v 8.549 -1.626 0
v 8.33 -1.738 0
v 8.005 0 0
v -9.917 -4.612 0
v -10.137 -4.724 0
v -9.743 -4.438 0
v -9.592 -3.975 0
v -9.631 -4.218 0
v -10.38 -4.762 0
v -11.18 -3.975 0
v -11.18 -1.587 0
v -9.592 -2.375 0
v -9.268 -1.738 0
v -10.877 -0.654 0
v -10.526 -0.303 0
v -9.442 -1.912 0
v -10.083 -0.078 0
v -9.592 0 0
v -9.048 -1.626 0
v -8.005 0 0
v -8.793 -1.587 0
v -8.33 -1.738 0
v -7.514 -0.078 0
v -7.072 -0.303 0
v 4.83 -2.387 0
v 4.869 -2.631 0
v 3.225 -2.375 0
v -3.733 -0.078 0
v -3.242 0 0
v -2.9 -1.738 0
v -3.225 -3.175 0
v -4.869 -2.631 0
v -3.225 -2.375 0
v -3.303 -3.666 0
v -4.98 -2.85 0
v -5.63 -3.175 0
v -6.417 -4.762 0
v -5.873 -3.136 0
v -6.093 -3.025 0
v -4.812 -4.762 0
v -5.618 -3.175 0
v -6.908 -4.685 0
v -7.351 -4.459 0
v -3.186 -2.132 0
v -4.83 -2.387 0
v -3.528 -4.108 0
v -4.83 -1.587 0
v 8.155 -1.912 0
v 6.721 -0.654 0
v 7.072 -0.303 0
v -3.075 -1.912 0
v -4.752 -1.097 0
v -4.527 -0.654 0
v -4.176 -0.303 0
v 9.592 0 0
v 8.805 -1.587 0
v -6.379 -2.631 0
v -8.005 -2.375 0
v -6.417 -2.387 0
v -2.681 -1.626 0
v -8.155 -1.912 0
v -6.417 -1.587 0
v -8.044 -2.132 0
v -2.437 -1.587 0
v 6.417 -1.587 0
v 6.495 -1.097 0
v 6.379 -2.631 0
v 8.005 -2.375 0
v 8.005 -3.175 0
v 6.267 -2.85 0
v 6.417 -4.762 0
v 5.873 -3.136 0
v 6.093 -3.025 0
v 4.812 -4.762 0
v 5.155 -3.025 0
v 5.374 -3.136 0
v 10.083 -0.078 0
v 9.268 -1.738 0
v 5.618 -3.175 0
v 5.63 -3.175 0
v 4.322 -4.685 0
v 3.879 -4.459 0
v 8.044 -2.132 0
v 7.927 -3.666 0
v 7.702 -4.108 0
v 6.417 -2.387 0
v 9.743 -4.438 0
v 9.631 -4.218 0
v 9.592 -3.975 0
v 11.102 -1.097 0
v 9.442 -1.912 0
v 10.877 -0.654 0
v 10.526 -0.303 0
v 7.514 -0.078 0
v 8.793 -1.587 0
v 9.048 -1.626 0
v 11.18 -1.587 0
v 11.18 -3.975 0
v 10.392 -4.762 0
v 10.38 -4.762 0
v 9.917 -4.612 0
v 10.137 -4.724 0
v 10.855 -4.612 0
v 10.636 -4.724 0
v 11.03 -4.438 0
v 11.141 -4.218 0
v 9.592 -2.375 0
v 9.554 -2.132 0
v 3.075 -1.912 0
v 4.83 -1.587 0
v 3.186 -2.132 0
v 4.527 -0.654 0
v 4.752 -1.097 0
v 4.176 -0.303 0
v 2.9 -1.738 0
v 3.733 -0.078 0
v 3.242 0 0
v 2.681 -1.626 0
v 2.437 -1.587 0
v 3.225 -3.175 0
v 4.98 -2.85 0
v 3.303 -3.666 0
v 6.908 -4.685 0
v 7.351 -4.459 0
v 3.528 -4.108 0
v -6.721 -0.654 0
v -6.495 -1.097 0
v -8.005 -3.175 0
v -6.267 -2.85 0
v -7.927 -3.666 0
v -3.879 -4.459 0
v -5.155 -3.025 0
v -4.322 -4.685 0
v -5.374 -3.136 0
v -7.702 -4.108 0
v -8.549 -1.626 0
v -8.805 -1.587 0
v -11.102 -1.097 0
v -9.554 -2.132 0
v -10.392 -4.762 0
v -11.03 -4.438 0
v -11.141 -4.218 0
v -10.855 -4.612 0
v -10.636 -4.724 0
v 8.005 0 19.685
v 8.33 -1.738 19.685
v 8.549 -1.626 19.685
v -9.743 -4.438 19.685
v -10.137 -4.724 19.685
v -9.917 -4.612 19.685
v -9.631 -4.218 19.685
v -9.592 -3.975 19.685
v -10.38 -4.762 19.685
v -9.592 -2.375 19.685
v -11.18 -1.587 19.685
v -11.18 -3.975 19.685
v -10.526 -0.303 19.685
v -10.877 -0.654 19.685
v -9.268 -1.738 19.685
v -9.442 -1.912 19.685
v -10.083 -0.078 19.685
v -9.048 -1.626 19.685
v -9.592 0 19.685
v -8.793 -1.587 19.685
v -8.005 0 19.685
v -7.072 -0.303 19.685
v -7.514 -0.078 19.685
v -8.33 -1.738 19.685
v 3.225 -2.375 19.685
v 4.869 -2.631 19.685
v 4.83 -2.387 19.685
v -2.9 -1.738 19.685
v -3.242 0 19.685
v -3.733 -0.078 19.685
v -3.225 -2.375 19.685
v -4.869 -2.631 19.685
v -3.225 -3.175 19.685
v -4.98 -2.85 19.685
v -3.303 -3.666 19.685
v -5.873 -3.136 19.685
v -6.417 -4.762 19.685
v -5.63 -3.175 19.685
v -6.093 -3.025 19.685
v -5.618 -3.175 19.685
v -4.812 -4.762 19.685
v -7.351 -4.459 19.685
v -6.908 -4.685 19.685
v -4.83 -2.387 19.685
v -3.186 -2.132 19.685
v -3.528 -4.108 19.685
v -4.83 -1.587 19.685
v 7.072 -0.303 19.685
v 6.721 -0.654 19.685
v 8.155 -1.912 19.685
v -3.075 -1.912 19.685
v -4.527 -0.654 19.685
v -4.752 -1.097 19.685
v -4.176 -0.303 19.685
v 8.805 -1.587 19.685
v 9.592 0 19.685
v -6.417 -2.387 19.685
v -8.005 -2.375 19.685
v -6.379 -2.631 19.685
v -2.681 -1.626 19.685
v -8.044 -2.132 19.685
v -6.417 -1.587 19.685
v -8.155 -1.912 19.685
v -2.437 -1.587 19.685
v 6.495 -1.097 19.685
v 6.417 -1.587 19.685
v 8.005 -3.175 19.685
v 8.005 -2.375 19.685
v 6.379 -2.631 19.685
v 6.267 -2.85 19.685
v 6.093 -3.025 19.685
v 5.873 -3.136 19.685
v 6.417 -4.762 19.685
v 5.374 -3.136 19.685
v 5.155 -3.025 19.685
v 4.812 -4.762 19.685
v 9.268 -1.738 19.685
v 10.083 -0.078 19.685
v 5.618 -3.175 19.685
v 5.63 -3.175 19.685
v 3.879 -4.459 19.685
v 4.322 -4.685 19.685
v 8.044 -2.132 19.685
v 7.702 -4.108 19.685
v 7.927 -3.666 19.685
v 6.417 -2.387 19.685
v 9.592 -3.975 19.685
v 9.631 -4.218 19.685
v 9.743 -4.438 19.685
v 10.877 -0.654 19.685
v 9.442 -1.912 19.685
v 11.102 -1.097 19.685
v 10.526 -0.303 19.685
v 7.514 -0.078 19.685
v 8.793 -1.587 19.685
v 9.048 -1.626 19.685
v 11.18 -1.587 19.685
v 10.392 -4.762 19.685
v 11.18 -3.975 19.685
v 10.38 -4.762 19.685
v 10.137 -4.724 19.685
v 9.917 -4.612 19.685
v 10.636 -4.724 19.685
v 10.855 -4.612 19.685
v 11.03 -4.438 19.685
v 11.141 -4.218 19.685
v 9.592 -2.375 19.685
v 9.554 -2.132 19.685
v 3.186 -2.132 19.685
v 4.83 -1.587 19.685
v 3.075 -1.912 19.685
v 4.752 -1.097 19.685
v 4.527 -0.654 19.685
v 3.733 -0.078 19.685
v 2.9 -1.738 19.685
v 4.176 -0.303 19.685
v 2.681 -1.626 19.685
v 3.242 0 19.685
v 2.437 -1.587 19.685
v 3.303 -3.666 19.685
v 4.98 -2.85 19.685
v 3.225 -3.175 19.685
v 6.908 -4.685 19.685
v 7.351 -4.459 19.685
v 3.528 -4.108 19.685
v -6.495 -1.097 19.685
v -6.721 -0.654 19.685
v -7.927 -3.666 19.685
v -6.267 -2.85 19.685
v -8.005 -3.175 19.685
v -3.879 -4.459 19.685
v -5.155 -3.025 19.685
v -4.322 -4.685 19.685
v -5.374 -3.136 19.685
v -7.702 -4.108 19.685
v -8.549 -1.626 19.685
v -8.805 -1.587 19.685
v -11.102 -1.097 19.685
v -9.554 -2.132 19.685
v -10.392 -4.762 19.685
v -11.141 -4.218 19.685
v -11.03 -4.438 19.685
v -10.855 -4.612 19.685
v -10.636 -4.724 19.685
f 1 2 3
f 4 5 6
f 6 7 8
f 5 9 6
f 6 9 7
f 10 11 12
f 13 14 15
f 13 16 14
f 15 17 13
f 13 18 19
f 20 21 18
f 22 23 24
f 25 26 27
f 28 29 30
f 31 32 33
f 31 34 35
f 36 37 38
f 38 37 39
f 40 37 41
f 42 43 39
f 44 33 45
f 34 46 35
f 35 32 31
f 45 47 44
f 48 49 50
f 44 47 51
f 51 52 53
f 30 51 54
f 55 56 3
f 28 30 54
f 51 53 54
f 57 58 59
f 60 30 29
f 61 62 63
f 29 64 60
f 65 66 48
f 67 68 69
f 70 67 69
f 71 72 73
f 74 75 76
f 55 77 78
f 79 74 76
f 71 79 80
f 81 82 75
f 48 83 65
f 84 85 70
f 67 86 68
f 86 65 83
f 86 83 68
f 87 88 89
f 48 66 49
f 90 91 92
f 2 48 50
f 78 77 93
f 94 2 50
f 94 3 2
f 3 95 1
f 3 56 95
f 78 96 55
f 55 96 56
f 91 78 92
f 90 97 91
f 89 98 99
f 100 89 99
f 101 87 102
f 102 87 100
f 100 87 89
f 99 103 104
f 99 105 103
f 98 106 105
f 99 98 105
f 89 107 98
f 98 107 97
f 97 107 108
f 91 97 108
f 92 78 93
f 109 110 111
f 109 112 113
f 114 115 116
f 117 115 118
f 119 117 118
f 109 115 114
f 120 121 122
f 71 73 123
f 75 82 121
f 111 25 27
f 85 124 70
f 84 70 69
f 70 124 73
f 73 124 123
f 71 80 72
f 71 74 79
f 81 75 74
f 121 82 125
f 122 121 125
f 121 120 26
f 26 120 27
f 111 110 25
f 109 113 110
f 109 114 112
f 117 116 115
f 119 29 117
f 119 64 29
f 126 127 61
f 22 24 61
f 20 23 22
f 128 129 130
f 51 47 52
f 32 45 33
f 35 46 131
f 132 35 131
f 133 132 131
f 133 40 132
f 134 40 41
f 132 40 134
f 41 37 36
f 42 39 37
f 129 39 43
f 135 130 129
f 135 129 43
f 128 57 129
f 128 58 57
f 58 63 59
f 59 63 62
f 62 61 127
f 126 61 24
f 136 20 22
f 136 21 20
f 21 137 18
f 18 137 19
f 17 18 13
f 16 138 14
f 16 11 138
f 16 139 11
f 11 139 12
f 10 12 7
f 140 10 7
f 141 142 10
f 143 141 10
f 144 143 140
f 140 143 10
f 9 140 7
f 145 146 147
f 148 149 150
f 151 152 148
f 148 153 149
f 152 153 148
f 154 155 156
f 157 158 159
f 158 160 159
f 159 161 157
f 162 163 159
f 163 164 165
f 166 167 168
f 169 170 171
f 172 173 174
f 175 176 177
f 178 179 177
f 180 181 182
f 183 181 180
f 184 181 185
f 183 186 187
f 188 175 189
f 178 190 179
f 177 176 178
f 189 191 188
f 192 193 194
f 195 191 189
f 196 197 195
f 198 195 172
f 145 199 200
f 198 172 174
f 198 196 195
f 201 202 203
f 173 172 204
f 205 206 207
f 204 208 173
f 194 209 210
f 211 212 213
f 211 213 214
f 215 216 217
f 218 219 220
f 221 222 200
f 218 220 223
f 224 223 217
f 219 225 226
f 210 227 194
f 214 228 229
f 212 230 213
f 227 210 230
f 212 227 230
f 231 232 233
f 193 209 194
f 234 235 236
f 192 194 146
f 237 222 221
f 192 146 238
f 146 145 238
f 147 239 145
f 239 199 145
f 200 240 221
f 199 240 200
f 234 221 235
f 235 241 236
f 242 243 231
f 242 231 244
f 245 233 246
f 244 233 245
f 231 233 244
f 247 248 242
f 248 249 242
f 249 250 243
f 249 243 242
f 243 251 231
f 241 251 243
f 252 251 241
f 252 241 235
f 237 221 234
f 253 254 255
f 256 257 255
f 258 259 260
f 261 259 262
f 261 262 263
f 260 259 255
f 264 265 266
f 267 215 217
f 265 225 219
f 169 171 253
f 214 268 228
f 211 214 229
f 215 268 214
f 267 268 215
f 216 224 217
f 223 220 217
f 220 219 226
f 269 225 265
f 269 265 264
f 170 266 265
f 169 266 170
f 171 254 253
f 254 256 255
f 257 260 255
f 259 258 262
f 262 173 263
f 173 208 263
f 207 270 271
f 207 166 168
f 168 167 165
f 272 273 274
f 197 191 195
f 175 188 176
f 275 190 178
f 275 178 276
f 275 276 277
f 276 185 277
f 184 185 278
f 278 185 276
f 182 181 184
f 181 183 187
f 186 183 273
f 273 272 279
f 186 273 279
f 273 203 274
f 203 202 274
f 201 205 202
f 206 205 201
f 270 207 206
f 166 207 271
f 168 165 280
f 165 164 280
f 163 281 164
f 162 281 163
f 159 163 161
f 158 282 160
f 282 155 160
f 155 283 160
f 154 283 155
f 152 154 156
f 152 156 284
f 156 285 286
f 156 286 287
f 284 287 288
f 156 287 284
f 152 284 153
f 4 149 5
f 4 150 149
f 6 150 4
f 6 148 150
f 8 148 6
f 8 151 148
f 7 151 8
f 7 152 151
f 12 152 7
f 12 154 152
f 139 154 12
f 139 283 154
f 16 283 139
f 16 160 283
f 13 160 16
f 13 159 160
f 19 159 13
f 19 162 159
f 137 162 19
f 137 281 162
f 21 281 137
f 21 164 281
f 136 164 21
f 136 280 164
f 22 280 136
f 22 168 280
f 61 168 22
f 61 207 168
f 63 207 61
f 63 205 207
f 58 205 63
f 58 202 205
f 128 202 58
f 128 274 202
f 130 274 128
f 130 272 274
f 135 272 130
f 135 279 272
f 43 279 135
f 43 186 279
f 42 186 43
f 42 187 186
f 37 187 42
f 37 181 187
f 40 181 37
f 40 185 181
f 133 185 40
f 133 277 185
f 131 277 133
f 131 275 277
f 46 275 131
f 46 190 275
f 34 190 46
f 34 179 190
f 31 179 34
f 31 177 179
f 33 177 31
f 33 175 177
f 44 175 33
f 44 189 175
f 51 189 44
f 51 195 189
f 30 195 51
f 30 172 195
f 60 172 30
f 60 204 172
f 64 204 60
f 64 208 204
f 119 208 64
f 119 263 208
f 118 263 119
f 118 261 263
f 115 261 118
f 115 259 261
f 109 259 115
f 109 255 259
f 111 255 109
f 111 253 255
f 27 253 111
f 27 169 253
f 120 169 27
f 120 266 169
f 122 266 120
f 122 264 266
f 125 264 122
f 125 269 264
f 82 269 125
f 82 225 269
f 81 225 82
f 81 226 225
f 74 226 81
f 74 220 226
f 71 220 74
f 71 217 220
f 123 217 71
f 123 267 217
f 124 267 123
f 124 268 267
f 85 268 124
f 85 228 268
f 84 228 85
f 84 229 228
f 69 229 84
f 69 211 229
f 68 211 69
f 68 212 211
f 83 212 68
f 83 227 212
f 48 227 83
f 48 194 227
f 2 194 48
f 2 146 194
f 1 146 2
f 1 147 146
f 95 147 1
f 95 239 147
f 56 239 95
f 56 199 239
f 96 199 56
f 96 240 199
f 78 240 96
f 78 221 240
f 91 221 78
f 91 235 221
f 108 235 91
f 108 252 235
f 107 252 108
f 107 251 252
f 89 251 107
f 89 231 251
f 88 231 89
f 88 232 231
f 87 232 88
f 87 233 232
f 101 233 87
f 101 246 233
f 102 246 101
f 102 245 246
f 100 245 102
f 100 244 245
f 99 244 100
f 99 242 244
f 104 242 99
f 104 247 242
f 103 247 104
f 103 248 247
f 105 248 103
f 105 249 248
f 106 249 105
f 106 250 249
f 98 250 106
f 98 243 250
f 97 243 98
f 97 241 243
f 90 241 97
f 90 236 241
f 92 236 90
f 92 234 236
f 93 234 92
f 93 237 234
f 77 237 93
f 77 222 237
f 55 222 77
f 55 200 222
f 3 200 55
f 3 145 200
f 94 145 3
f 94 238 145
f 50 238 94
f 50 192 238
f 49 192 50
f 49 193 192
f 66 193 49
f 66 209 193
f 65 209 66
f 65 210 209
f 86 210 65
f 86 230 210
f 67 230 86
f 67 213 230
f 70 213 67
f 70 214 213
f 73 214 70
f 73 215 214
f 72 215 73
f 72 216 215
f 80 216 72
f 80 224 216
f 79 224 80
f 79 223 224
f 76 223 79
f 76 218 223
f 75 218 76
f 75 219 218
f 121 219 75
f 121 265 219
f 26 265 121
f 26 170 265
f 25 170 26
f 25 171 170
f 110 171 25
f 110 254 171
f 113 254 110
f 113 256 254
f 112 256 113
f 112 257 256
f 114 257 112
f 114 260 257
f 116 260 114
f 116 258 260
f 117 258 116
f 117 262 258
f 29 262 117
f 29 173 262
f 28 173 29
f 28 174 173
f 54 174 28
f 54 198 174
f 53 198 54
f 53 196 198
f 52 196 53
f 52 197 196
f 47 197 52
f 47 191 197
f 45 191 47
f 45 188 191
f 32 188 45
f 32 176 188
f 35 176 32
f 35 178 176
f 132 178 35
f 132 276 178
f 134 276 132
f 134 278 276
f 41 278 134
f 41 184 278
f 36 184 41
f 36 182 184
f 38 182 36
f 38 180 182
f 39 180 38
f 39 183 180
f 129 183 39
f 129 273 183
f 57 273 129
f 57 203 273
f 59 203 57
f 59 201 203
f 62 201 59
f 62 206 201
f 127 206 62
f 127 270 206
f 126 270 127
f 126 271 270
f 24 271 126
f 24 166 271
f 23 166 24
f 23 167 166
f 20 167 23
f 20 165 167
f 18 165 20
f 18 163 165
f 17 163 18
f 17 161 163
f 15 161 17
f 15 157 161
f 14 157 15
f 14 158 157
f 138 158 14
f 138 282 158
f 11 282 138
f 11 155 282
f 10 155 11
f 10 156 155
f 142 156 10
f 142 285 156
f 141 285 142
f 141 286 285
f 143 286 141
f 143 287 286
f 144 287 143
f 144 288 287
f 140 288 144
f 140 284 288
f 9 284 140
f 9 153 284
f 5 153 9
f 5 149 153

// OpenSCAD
// file: ../lib/TOGUnitTable-v1.scad
// TOGUnitTable-v1.1.0 - Library for handling 'complex amounts' in the form of [multiplier, unit name], e.g. [1.5, "inch"]
//
// 2023-07-01: the following 'annotation' is something I just made up,
// but is intended as a way for future packaging tools to know that it's 'safe'
// (because everything has been somewhat namespaced) to turn a `use <x>`
// into an `include <x>`, making it inlinable:
// safe-to-include: true
// 
// Versions:
// v1.0.0:
// - Created it.
// v1.1.0:
// - Add optional 'dbgctxstr' parameter to unit decoding functions, for better error messages
// 
// Naming convention:
// Doing 'OO without classes', here.
// Fully qualified name = class or package name + "__" + member name
// Class or package name may itself be namespaced, and class names may double as package names.
// Here, tog_unittable names both a class and a package.

// Demo unit table uses 'micrometer' as the base unit
// in order to keep multipliers as integers as much as possible.
tog_unittable__demo_unit_table = [
	["um",    [    1   ,   "um"], "micrometer" ],
	["mm",    [ 1000   ,   "um"], "millimeter" ],
	["inch",  [25400   ,   "um"], "inch"       ],
	["u",     [    1/16, "inch"], "model unit" ], // As used by TGx9 et al
	["atom",  [    8   ,    "u"], "model atom" ],
	["chunk", [    3   , "atom"], "model chunk"],
];

use <./DbgCtxStrLib1.scad>

function tog_unittable__list__filter(list, predicate) = [
	for( item=list ) if( predicate(item) ) item
];
function tog_unittable__list__first(list, on_error) =
	len(list) > 0 ? list[0] : on_error();

function tog_unittable__unit_value_ca(unit_table, unit_name, dbgctxstr=undef) =
	tog_unittable__list__first(
		tog_unittable__list__filter(unit_table, function (entry) entry[0] == unit_name),
		function () assert(false,
			str("Did not find entry for unit '", unit_name, "' in unit table", dbgctxstr_errmsg_suffix(dbgctxstr))
		)
	)[1];

function tog_unittable__ca__is_valid( ca ) =
	is_list(ca) && len(ca) == 2;

// Break down 'amount' until it is in a base unit (one which is defined in terms of itself)
function tog_unittable__simplify_ca(unit_table, amount, dbgctxstr=undef) =
	assert( tog_unittable__ca__is_valid(amount), str(amount, " is not a valid Complex Amount (should be [numeric_value, \"unit_name\"])", dbgctxstr=dbgctxstr) )
	let( unit_value_ca = tog_unittable__unit_value_ca(unit_table, amount[1], dbgctxstr=dbgctxstr) )
	unit_value_ca[1] == amount[1] ? amount :
		tog_unittable__simplify_ca(unit_table, [amount[0] * unit_value_ca[0], unit_value_ca[1]]);

function tog_unittable__divide_ca(unit_table, numerator, denominator, dbgctxstr=undef) =
	let(
		numerator_base_ca   = tog_unittable__simplify_ca(unit_table, numerator, dbgctxstr=dbgctxstr),
		denominator_base_ca = tog_unittable__simplify_ca(unit_table, denominator, dbgctxstr=dbgctxstr)
	)
	assert(numerator_base_ca[1] == denominator_base_ca[1], str("Different base units found for ", numerator[1], " and ", denominator[1]))
	numerator_base_ca[0] / denominator_base_ca[0];	

assert(tog_unittable__divide_ca(tog_unittable__demo_unit_table, [1,   "mm"], [  1, "mm"]) ==     1   );
assert(tog_unittable__divide_ca(tog_unittable__demo_unit_table, [1,   "mm"], [  1, "um"]) ==  1000   );
assert(tog_unittable__divide_ca(tog_unittable__demo_unit_table, [1, "inch"], [  1, "um"]) == 25400   );
assert(tog_unittable__divide_ca(tog_unittable__demo_unit_table, [1, "inch"], [  1, "mm"]) ==    25.4 );
assert(tog_unittable__divide_ca(tog_unittable__demo_unit_table, [1, "inch"], [254, "um"]) ==   100   );
assert(tog_unittable__divide_ca(tog_unittable__demo_unit_table, [1,    "u"], [  1, "um"]) ==  1587.5 );
// file: ../lib/TOGStringLib1.scad
// TOGStringLib1.7
// 
// Functions for parsing quantities
// and other misc. string handling.
// 
// v1.5
// - togstr1_parse_quantity will treat unit-only strings as meaning 1/1 of that unit.
//   e.g. togstr1_parse_quantity("foot") = [[[1,1], "foot", 4]]
// v1.6:
// - togstr1_parse_quantity allows unit name to be omitted when quantity is zero and $togunits1_default_unit is defined
// v1.7:
// - Add optional 'dbgctxstr' parameter to unit decoding functions, for better error messages
// 
// Globals: $togunits1_default_unit - affects what 'unit' is returned
// when interpreting numbers or strings that lack the unit.


function togstr1__todo(message) = assert(false, str("TODO: ", message));

module togstr1__assert_eq(a, b) {
	if( a != b ) {
		assert( a == b, str(a, " != ", b) );
	}
}



function togstr1_slice(source, i0, i1) =
	i0 == i1 ? "" :
	str(source[i0], togstr1_slice(source, i0+1, i1));

function togstr1_tokenize(source, sep, maxcount=9999, i=0, tokenstart=0) =
	len(source) == i ? (
		(tokenstart < i) ? [togstr1_slice(source, tokenstart, i)] : []
	) :
	source[i] == sep ? (
		(tokenstart < i) ? concat([togstr1_slice(source, tokenstart, i)], togstr1_tokenize(source, sep, maxcount-1, i+1, i+1)) :
		togstr1_tokenize(source, sep, maxcount, i+1, i+1)
	) :
	maxcount <= 1 ? [togstr1_slice(source, tokenstart, len(source))] :
	togstr1_tokenize(source, sep, maxcount, i+1, tokenstart);

togstr1__assert_eq( ["foo","bar","baz"], togstr1_tokenize("foo-bar-baz", "-") );
// Duplicate delimiters are ignored
togstr1__assert_eq( ["foo","bar","baz"], togstr1_tokenize("foo--bar--baz", "-") );
// Trailing delimiters are ignored
togstr1__assert_eq( ["foo","bar","baz"], togstr1_tokenize("foo--bar--baz--", "-") );
// Leading delimiters are ignored
togstr1__assert_eq( ["foo","bar","baz"], togstr1_tokenize("--foo--bar--baz", "-") );
// Can limit number of tokens returned
togstr1__assert_eq( ["foo","bar-baz"], togstr1_tokenize("foo-bar-baz", "-", 2) );
togstr1__assert_eq( ["foo","bar-baz"], togstr1_tokenize("--foo--bar-baz", "-", 2) );
togstr1__assert_eq( ["foo","bar--baz"], togstr1_tokenize("--foo--bar--baz", "-", 2) );
togstr1__assert_eq( ["foo"], togstr1_tokenize("--foo--", "-", 2) );




/** \d+ -> [num, end_index] */
function togstr1_parse_decimal_nat(str, index=0, current=0, dbgctxstr=undef) =
	len(str) == index ? [current, index] :
	let( dig = ord(str[index]) - ord("0") )
	(dig >= 0 && dig <= 9) ? togstr1_parse_decimal_nat(str, index+1, current*10 + dig, dbgctxstr=dbgctxstr) :
	[current, index];

togstr1__assert_eq( [123,3], togstr1_parse_decimal_nat("123") );
togstr1__assert_eq( [123,3], togstr1_parse_decimal_nat("123.45") );

/** [+-]*\d+ ->  [[num, den], end_index] */
function togstr1_parse_decimal_number(str, index=0, dbgctxstr=undef) =
	str[index] == "+" ? togstr1_parse_decimal_number(str, index+1) :
	str[index] == "-" ? let(r=togstr1_parse_decimal_number(str, index+1)) [[-r[0][0], r[0][1]], r[1]] :
	let(r = togstr1_parse_decimal_nat(str, index, dbgctxstr=dbgctxstr))
	str[r[1]] != "." ? [[r[0], 1], r[1]] :
	let(fracr = togstr1_parse_decimal_nat(str, r[1]+1))
	let(mult = pow(10, fracr[1]-(r[1]+1)))
	[[r[0]*mult + fracr[0], mult], fracr[1]];

togstr1__assert_eq( [[   36,   1], 2], togstr1_parse_decimal_number( "36"   ) );
togstr1__assert_eq( [[ 3524, 100], 5], togstr1_parse_decimal_number( "35.24") );
togstr1__assert_eq( [[-3524, 100], 6], togstr1_parse_decimal_number("-35.24") );
togstr1__assert_eq( [[    0,   1], 0], togstr1_parse_decimal_number( "NotANumber") );

function togstr1__gcd(a, b) = b == 0 ? abs(a) : togstr1__gcd(b, a % b);

togstr1__assert_eq(10, togstr1__gcd(10, 20));
togstr1__assert_eq( 5, togstr1__gcd(10, 15));
togstr1__assert_eq( 2, togstr1__gcd(10, 14));


function togstr1__normalize_rat(rat) =
	let(gcd = togstr1__gcd(rat[0], rat[1]))
	// TODO: find LCD, divide top and bottom by it
	rat[0] < 0 && rat[1] < 0 ? [-rat[0]/gcd, -rat[1]/gcd] :
	[rat[0]/gcd, rat[1]/gcd];

/** <decnum>[/<decnum>] -> [[num, den], end_index] */
function togstr1__multiply_rat(a, b) =
	togstr1__normalize_rat(
		a[1] == b[1] ? [a[0]*b[0]/a[1], a[1]] : // TODO: LCD instead of special case
		[a[0]*b[0], a[1]*b[1]]
	);
function togstr1__divide_rat(a, b) = togstr1__normalize_rat([a[0]*b[1], a[1]*b[0]]);


function togstr1__add_rat(a, b) =
	togstr1__normalize_rat([a[0]*b[1] + b[0]*a[1], a[1]*b[1]]);
	
togstr1__assert_eq([1, 2], togstr1__add_rat([1, 3], [1, 6]));


/** Return [[num, den], end_index] */
function togstr1_parse_rational_number(str, index=0, dbgctxstr=undef) =
	let( numr = togstr1_parse_decimal_number(str, index, dbgctxstr=dbgctxstr) )
	str[numr[1]] == "+" ?
		let(numrb = togstr1_parse_rational_number(str, numr[1]+1, dbgctxstr=dbgctxstr))
		[togstr1__add_rat(numr[0], numrb[0]), numrb[1]]	:
	str[numr[1]] == "/" ?
		let( denr = togstr1_parse_decimal_number(str, numr[1]+1, dbgctxstr=dbgctxstr) )
		[togstr1__divide_rat(numr[0], denr[0]), denr[1]] :
	numr;

togstr1__assert_eq( [[   123,  1],3], togstr1_parse_rational_number( "123") );
togstr1__assert_eq( [[   123,  1],4], togstr1_parse_rational_number("+123") );
togstr1__assert_eq( [[-  123,  1],4], togstr1_parse_rational_number("-123") );
togstr1__assert_eq( [[   123,  1],6], togstr1_parse_rational_number("-+-123") );
togstr1__assert_eq( [[ 12345,100],6], togstr1_parse_rational_number("123.45") );
togstr1__assert_eq( [[  2469, 40],8], togstr1_parse_rational_number("123.45/2") );
togstr1__assert_eq( [[-  823,160],10], togstr1_parse_rational_number("-123.45/24") );
togstr1__assert_eq( [[     4,  3],5], togstr1_parse_rational_number( "1+1/3") );
togstr1__assert_eq( [[     0,  1],0], togstr1_parse_rational_number( "NotANumber!!") );


/** Return [[[num, den], unit], end_index] */
function togstr1_parse_quantity(str, dbgctxstr=undef) =
	let( numr = togstr1_parse_rational_number(str, dbgctxstr=dbgctxstr) )
	// For now, just let the unit be the rest of the string;
	// can revisit to stop at delimiters if needed in the future.
	numr[1] > 0 && numr[1] == len(str) && numr[0][0] == 0 && !is_undef($togunits1_default_unit) ? [[[0,1], $togunits1_default_unit], numr[1]] :
	assert( numr[1] < len(str), str("Quantity string missing unit: '", str, "'; note that '0' is acceptable if $togunits1_default_unit is defined"))
	let( unit = togstr1_slice(str, numr[1], len(str)) )
	let( quant = numr[1] > 0 ? numr[0] : [1,1] ) // No number = 1 (possibly this should be an error instead)
	[[quant, unit], len(str)];

togstr1__assert_eq( [[[  3,  1], "acre"],  5], togstr1_parse_quantity("3acre") );
togstr1__assert_eq( [[[  3,  5], "acre"],  7], togstr1_parse_quantity("3/5acre") );
togstr1__assert_eq( [[[301,500], "acre"], 10], togstr1_parse_quantity("3.01/5acre") );
togstr1__assert_eq( [[[  1,  1], "acre"],  4], togstr1_parse_quantity("acre") ); // Should either treat as one or throw an error!
togstr1__assert_eq( [[[  0,  1],"hectare"],1], togstr1_parse_quantity("0", $togunits1_default_unit="hectare") ); // Zero is fine if $togunits1_default_unit is defined
// file: ../lib/TOGridLib3.scad
// TOGridPileLib-v3.4
// 
// HOKAY WHAT ARE THE COMMON
// things that I want the library to do?
// 
// - [X] Be `include`-able, to make inlining easy
// - [X] Allow unit table to be overridden easily, but default by default
// - [ ] Support common configurations by name (e.g. "V9", or some "WSTYPE-...")
//   without having to pass 50 different parameters in
// - [ ] Support subtractions for those common configurations also,
//   such that you don't need to remember to 'do less rounding', etc.
// - [ ] Make a simple foot-only block that I can subtract stuff from
//   params: foot style
// - [ ] Make a block with a lip
// - [ ] Make a block foot, and I'll intersect it with some other things
// - [X] Translate a block_size_ca to mm
// 
// Changes:
// v3.1:
// - s/togridpile3_decode_size/togridpile3_decode_vector/
// v3.2:
// - togridpile3_decode(num) = num
// v3.3:
// - Change prefix from `togridpile3` to `togridlib3`
// v3.4:
// - Add optional 'dbgctxstr' parameter to unit decoding functions, for better error messages

use <../lib/TOGUnitTable-v1.scad>

function togridlib3_map(arr, fn) = [ for(item=arr) fn(item) ];

togridlib3_default_unit_table = [
	["um",    [    1,               "um"]],
	["mm",    [ 1000,               "um"]],
	["inch",  [25400,               "um"]],
	["u",     [    1.5875,          "mm"]],
	["atom",  [    8,                "u"]],
	["chunk", [    3,             "atom"]],
	["tgp-standard-bevel"   , [2,    "u"]], // Usuually 1/8"
	["m-outer-corner-radius", [4,    "u"]],
	["f-outer-corner-radius", [3,    "u"]],
];

function togridlib3_get_default_unit_table() = togridlib3_default_unit_table;
function togridlib3_get_unit_table() = is_undef($togridlib3_unit_table) ? togridlib3_default_unit_table : $togridlib3_unit_table;

function togridlib3_decode(dim, unit=[1, "mm"], unit_table=togridlib3_get_unit_table(), dbgctxstr=undef) =
	is_num(dim) ? dim : tog_unittable__divide_ca(unit_table, dim, unit, dbgctxstr=dbgctxstr);
function togridlib3_decode_vector(size, unit=[1, "mm"], unit_table=togridlib3_get_unit_table(), dbgctxstr=undef) =
	togridlib3_map(size, function(dim) is_num(dim) ? dim : tog_unittable__divide_ca(unit_table, dim, unit, dbgctxstr=dbgctxstr));

module togridlib3_cube(size, offset=0) {
	cube(togridlib3_decode_vector(size), center=true);
}
// file: ../lib/DbgCtxStrLib1.scad
// DbgCtxStrLib1.0
// 
// Library for dealing with 'debug context strings' (usually 'dbgctxstr').

function dbgctxstr_errmsg_suffix(dbgctxstr) =
	is_undef(dbgctxstr) || dbgctxstr == "" ? "" :
	str(" (", dbgctxstr, ")");
// file: ../lib/TOGComplexLib1.scad
function tcplx1_multiply(a, b) =
	[a[0]*b[0] - a[1]*b[1], a[0]*b[1] + a[1]*b[0]];
function tcplx1_divide(a, b) =
	let(bot = (b[0]*b[0] + b[1]*b[1]))
	[
		(a[0]*b[0] + a[1]*b[1])/bot,
		(a[1]*b[0] - a[0]*b[1])/bot
	];

assert([-11,23] == tcplx1_multiply([3,2], [1,7]));

assert([-1,3] == tcplx1_multiply([3,1], [0,1]));
assert([-1,3] == tcplx1_multiply([0,1], [3,1]));

echo(tcplx1_divide([-1,3], [3,1]));
assert([0,1] == tcplx1_divide([-1,3], [3,1]));

function tcplx1_normalize(vec) =
	let(veclen = sqrt(vec[0]*vec[0]+vec[1]*vec[1]))
	[vec[0] / veclen, vec[1] / veclen];

function tcplx1_relative_turnvec_vv(v0, v1) =
	tcplx1_divide(tcplx1_normalize(v1), tcplx1_normalize(v0));

function tcplx1_relative_turnvec_abc(p0, p1, p2) = tcplx1_relative_turnvec_vv(p1-p0, p2-p1);

// A 90-degree turn
assert([0,1] == tcplx1_relative_turnvec_abc([0,0], [1,0], [1,1]));
assert([0,1] == tcplx1_relative_turnvec_abc([0,0], [0,1], [-1,1]));

// A 45-degree turn
assert(tcplx1_normalize([1,1]) == tcplx1_relative_turnvec_abc([0,0], [1,0], [ 2,1]));
assert(tcplx1_normalize([1,1]) == tcplx1_relative_turnvec_abc([0,0], [0,1], [-1,2]));


function tcplx1_relative_angle_abc(p0, p1, p2) =
	let(turnvec = tcplx1_relative_turnvec_abc(p0, p1, p2))
	atan2(turnvec[1], turnvec[0]);

assert(-135 == tcplx1_relative_angle_abc([0,0], [1,0], [0,-1]));
assert( -90 == tcplx1_relative_angle_abc([0,0], [1,0], [1,-1]));
assert(   0 == tcplx1_relative_angle_abc([0,0], [1,0], [2, 0]));
assert(  90 == tcplx1_relative_angle_abc([0,0], [1,0], [1, 1]));
assert( 135 == tcplx1_relative_angle_abc([0,0], [1,0], [0, 1]));

assert(  90 == tcplx1_relative_angle_abc([1,1], [3,3], [1, 5]));
// file: ../lib/TOGArrayLib1.scad
// TOGArrayLib1.5
// 
// Functions for working with arrays.
// 
// v1.1:
// - tal1_reduce assert(is_list(items)) to prevent infinite recursion
//   when given undefined or other non-list values
// v1.1.1:
// - Fix tal1_uniq_remap_v2 to return "list-remap-result" as the
//   first element of the returned list
// v1.2:
// - Add tal1_replace_at function
// v1.3:
// - tal1_is_vec_of, tal1_is_vec_of_num
// v1.4:
// - tal1_assert_for_each, for when you want to assert something
//   about each of a list of items and get nice failure messages
// v1.5:
// - Add tal1_duplicate_reversed function, which may be
//   handy when generating symmetrical polygons and stuff.

/**
 * Make a list with the contents of list `a`,
 * but starting at offset `off`, replaced by the contents of list `b`.
 * len(result) = max(len(a), off+len(b))
 */
function tal1_replace_at(a, off, b, default_value=undef, default_value_function=undef) =
	assert(is_list(a))
	assert(is_list(b))
	let( _dvf = !is_undef(default_value_function) ? default_value_function : function(i) default_value )
[
	for( i=[0:1:min(off,len(a))-1] ) a[i],
	for( i=[len(a):1:off-1] ) _dvf(i),
	for( i=[off:1:off+len(b)-1] ) b[i-off],
	for( i=[off+len(b):1:len(a)-1] ) a[i],
];

// Simplest case
assert([] == tal1_replace_at([], 0, []));
// Second simplest cases
assert(["foo"] == tal1_replace_at(["foo"], 0, []));
assert(["foo"] == tal1_replace_at([], 0, ["foo"]));
// Replace one item
assert(["foo","quux","baz"] == tal1_replace_at(["foo","bar","baz"], 1, ["quux"]));
// Replace and extend
assert(["foo","quux","tuna","tina"] == tal1_replace_at(["foo","bar","baz"], 1, ["quux", "tuna", "tina"]));
// Add beyond end of `a`
assert(["foo","zzz","quux"] == tal1_replace_at(["foo"], 2, ["quux"], default_value="zzz"));
// Adding 'nothing' should still fill to that point with defaults
assert(["foo","zzz","zzz"] == tal1_replace_at(["foo"], 3, [], default_value="zzz"));


function tal1_reduce(start, items, func, offset=0) =
	assert(is_list(items))
	len(items) == offset ? start :
	tal1_reduce(func(start, items[offset]), items, func, offset+1);

function tal1_consecutive_duplicate_count(items) = tal1_reduce(
	[0, undef],
	items,
	function(z,item) [z[0] + (item == z[1] ? 1 : 0), item]
)[0];

assert(0 == tal1_consecutive_duplicate_count([]));
assert(0 == tal1_consecutive_duplicate_count([50]));
assert(1 == tal1_consecutive_duplicate_count([50,50]));
assert(0 == tal1_consecutive_duplicate_count([50,51,52,53]));
assert(1 == tal1_consecutive_duplicate_count([50,51,52,52]));
assert(3 == tal1_consecutive_duplicate_count([50,50,50,50]));

// Set test_size to arbirarily large values
// to ensure that OpenSCAD can handle heavy recursion
let(test_size=1000) assert(test_size/2 == tal1_consecutive_duplicate_count([for(i=[0:1:test_size-1]) floor(i/2)]));



function tal1_uniq_(items, off0, off1) =
	let(chunklen = off1-off0)
	chunklen == 0 ? [] :
	chunklen == 1 ? [items[off0]] :
	let(half=floor(chunklen/2))
	let(left  = tal1_uniq_(items, off0     , off0+half))
	let(right = tal1_uniq_(items, off0+half, off1     ))
	assert(len(left) > 0)
	assert(len(right) > 0)
	left[len(left)-1] == right[0] ? [each left, for(i=[1:1:len(right)-1]) right[i]] :
	[each left, each right];

/** Given a list of items, returns a new list with identical consecutive items merged */
function tal1_uniq(items) = tal1_uniq_(items, 0, len(items));

assert([] == tal1_uniq([]));
assert([123] == tal1_uniq([123]));
assert([55,0,1,2,3] == tal1_uniq([55,0,1,2,3]));
assert([55,0,1,2] == tal1_uniq([55,0,1,1,2]));
assert([55,0,1] == tal1_uniq([55,55,0,0,0,0,0,0,1,1,1,1]));
assert([55,0] == tal1_uniq([55,0,0,0,0,0,0,0]));



/**
 * Returns [new items, old index -> new index mapping].
 * No-op version.
 */
function tal1_uniq_remap_v1(items) =
	["list-remap-result", items, [for (vi=[0:1:len(items)-1]) vi]];

// [a, a, b, b, c, c]
//
// [a,    ...], []  -> [a],[0]
// [a, a, ...], [0] -> [a],[0,0]

assert([1,2,3] == [1,2,3]);

/**
 * Recursive version that will combine adjacent identical vertexes,
 * but will use the original items.
 */
function tal1_uniq_remap_v2(items, map=[]) =
	let(index = len(map))
	len(items) == index ? ["list-remap-result", items, map] :
	index == 0 ? tal1_uniq_remap_v2(items, [0]) :
	items[index] == items[map[index-1]] ? tal1_uniq_remap_v2(items, [for(vi=map) vi, map[index-1]]) :
	tal1_uniq_remap_v2(items, [for(vi=map) vi, index]);

assert(tal1_uniq_remap_v2([1,1,2,2,3,4]) == ["list-remap-result", [1,1,2,2,3,4], [0,0,2,2,4,5]]);


/**
 * Returns true if `vec` is a list of at least min_len items
 * and component_check(each item, even those beyond min_len) is true.
 */
function tal1_is_vec_of(vec, min_len=0, component_check=function(x) true) =
	assert(is_num(min_len) && min_len >= 0)
	assert(is_function(component_check))
	is_list(vec) && len(vec) >= min_len &&
	tal1_reduce(true, vec, function(prev,item) prev && component_check(item));

function tal1_is_vec_of_num(vec, min_len=0) = tal1_is_vec_of(vec, min_len, function(i) is_num(i));

assert( true == tal1_is_vec_of_num([1,2,3]));
assert( true == tal1_is_vec_of_num([]));
assert( true == tal1_is_vec_of_num([1,2,3], 3));
assert(false == tal1_is_vec_of_num([1,2], 3));
assert(false == tal1_is_vec_of_num([1,2,"spoon"], 3));
// Requirements are ambiguous when
// first min_len items are numbers, but there are non-numeric items afterwards,
// so let's error on the side of saying 'no, it's not a list of numbers';
// i.e. the item check and the min_len are independent.
assert(false == tal1_is_vec_of_num([1,2,3,"artichoke"], 3));


/**
 * Asserts that item_checker(each item in list, index of item)[0] is true.
 * Second element of item_checker return value is assertion message.
 * Returns the original list, in case that's useful to you.
 */
function tal1_assert_for_each(list, item_checker) =
	let( _ignored = [ for(i=[0:1:len(list)-1])
		let(q=item_checker(list[i],i))
		let(passed=is_bool(q) ? q : is_list(q) ? q[0] : assert(false, str(
			"tal1_assert_for_each: item_checker should return Bool|[Bool,String], but returned ",
			q, " for item at index ", i)))
		let(message=is_list(q) ? q[1] : undef)
		assert(passed, message)
		q
	])
	list;

// Callback can return a boolean...
assert([1,2,3] == tal1_assert_for_each([1,2,3], function(v,i) is_num(v)));
// ...or a [boolean, string]
assert([1,2,3] == tal1_assert_for_each([1,2,3], function(v,i) [is_num(v), "element be a num"]));

// [a, b, c] -> [a, b, c, rxf(c), rxf(b), rxf(a)]
function tal1_duplicate_reversed(list, rxf=function(item) item) =
	[
		each list,
		for( i=[len(list)-1 : -1 : 0] ) rxf(list[i]),
	];
// file: ../lib/TOGUnits1.scad
// TOGUnits1.7
// 
// For simlifying quantity parsing and unit conversion
// 
// v1.1:
// - Add `togunits1_decode` function
// v1.2:
// - Add togunits1_decode_vec
// v1.3:
// - Add togunits1_vec_to_cas
// v1.4:
// - Add togunits1_vec_to_mms
// v1.5:
// - Remove unused `unit` parameter from `togunits1_vec_to_cas`
// v1.6:
// - togunits1_decode accepts `xf` parameter, same as togunits1_decode_vec
// v1.7:
// - Add optional 'dbgctxstr' parameter to unit decoding functions, for better error messages
// 
// Reserved but not-yet-actually-used globals:
// - $togunits1_default_unit - default unit when interpreting "0"
//   - See TOGStringLib1
// - $togunits1_default_implied_unit - when interpreting quantities without unit, assume they have this one
//   - This might be a bad idea, so never implemented!

use <./DbgCtxStrLib1.scad>
use <./TOGridLib3.scad>
use <./TOGStringLib1.scad>

function togunits1__is_ca(what) =
	is_list(what) && len(what) == 2 && is_num(what[0]) && is_string(what[1]);

function togunits1__parse_to_ca(what, dbgctxstr=undef) =
	assert( is_string(what) )
	let( parseresult = togstr1_parse_quantity(what, dbgctxstr) )
	assert( parseresult[1] > 0, str("Failed to parse quantity from  ", what, dbgctxstr=dbgctxstr) )
	let( parsed = parseresult[0] )
	let( rat = parsed[0] )
	let( unit = parsed[1] )
	[rat[0]/rat[1], unit];

function togunits1_to_ca(what, dbgctxstr=undef) =
	is_string(what) ? togunits1__parse_to_ca(what, dbgctxstr=dbgctxstr) :
	togunits1__is_ca(what) ? what :
	is_num(what) ? [what, "mm"] :
	assert(false, str("Unrecognized quantity representation: ", what));

function togunits1_vec_to_cas(whats) =
	[for(w=whats) togunits1_to_ca(w)];

function togunits1__get_transform(name) =
	is_function(name) ? name :
	is_undef(name) ? function(n) n :
	name == "round" ? function(n) round(n) :
	name == "ceil" ? function(n) ceil(n) :
	assert(false, str("Unrecognized transform: '", name, "'"));

function togunits1_decode(what, unit=[1,"mm"], xf=undef, dbgctxstr=undef) =
	let( ca = togunits1_to_ca(what, dbgctxstr=dbgctxstr) )
	let( xf1 = togunits1__get_transform(xf) )
	xf1(togridlib3_decode(ca, unit=togunits1_to_ca(unit), dbgctxstr=dbgctxstr));

function togunits1_decode_vec(whats, unit=[1,"mm"], xf=undef) =
	let( unit_ca = togunits1_to_ca(unit) )
	let( xf1 = togunits1__get_transform(xf) )
	[for(w=whats) xf1(togunits1_decode(w, unit_ca))];

function togunits1_to_mm(what, dbgctxstr=undef) = togunits1_decode(what, [1,"mm"], dbgctxstr=dbgctxstr);
function togunits1_vec_to_mms(what) = togunits1_decode_vec(what, [1,"mm"]);
// file: ../lib/TOGMod1Constructors.scad
// TOGMod1Constructors-v1.11
// 
// Functions to construct objects understood by TOGMod1
// 
// v1.1:
// - Add togmod1_make_rounded_rect
// v1.2:
// - togmod1_make_rounded_rect can make ovals
// v1.3:
// - togmod1_circle_points, to just get the points of a circle
// - if pos parameter to circle function has a third element,
//   returned vertexes will include it as the z component;
// v1.3.1
// - Some assertions
// v1.4:
// - Refactor togmod1_rounded_rect_points and togmod1_circle_points
//   to use togmod1__make_nd_vector_adder for adapting to whatever
//   `pos` parameter is.
// v1.5:
// - togmod_rounded_rect_points will not simplify completely rounded sides
//   (where length of side is exactly twice the rounding radius)
//   unless simplify_rounded_sides=true
//   - This makes it more useful for polyhedron generation,
//     where radius varies, but number of points must remain constant.
// v1.6:
// - togmod1_make_rect makes a simple rectangle
// - togmod1_make_rounded_rect will defer to togmod1_make_rect when r=0
// v1.7:
// - togmod1_make_circle will return empty shape (["union"]) when d=0
// v1.8:
// - Add togmod1_text
// v1.9:
// - togmod1_circle_points uses 3 as minimum circle point count instead of 6
// v1.10:
// - Fix togmod1_linear_extrude_y so that range corresponds to Y start/end and
//   polygon X,Y correspond to X,Z.  Previously it was rotated wrongly,
//   which would have gone unnoticed for symmetrical shapes centered at 0,0.
// v1.11:
// - Remove an 'echo'

use <./TOGArrayLib1.scad>

function togmod1__make_nd_vector_adder(origin=[0,0]) =
	let(origin_is_zero = tal1_reduce(true, origin, function(prev,item) prev && item == 0))
	origin_is_zero ? (function(vec) len(vec) >= len(origin) ? vec : tal1_replace_at(origin, 0, vec)) :
	function(vec) [
		for(i=[0:1:max(len(origin),len(vec))-1]) (len(vec) > i ? vec[i] : 0) + (len(origin) > i ? origin[i] : 0),
	];

assert([1,2,3] == togmod1__make_nd_vector_adder()([1,2,3]));
assert([1,2,3] == togmod1__make_nd_vector_adder([0,0,3])([1,2]));


function togmod1_make_cuboid(size) =
	assert(is_list(size))
	assert(len(size) >= 3)
	assert(is_num(size[0]))
	assert(is_num(size[1]))
	assert(is_num(size[2]))
	["polyhedron-vf", [
		[-size[0]/2, -size[1]/2, -size[2]/2],
		[+size[0]/2, -size[1]/2, -size[2]/2],
		[-size[0]/2, +size[1]/2, -size[2]/2],
		[+size[0]/2, +size[1]/2, -size[2]/2],
		[-size[0]/2, -size[1]/2, +size[2]/2],
		[+size[0]/2, -size[1]/2, +size[2]/2],
		[-size[0]/2, +size[1]/2, +size[2]/2],
		[+size[0]/2, +size[1]/2, +size[2]/2]
	], [
		[0,1,3,2],[0,4,5,1],[4,6,7,5],[3,7,6,2],[1,5,7,3],[6,4,0,2]
	]];

function togmod1_make_polygon(verts) =
	["polygon-vp", verts, [[for( i=[0:1:len(verts)-1] ) i%len(verts)]]];

function togmod1_rounded_rect_points(size, r, pos=[0,0], simplify_rounded_sides=false) =
	assert(is_list(size))
	assert(len(size) >= 2)
	let(radii = is_list(r) ? r : is_num(r) ? [r,r] : assert(false, "rounded_rect r(adius) should be list<num> or num"))
	let(rx = radii[0])
	let(ry = radii[1])
	assert(is_num(rx))
	assert(is_num(ry))
	assert(size[0] >= 2*rx, str("size[0] must be >= 2*r[0]; size[0] = ",size[0],", 2*r[0] = ",2*rx))
	assert(size[1] >= 2*ry, str("size[1] must be >= 2*r[1]; size[1] = ",size[1],", 2*r[1] = ",2*ry))
	let(quarterfn=max($fn/4, 1))
	let(qfnx = simplify_rounded_sides && size[0] == 2*rx ? quarterfn-1 : quarterfn)
	let(qfny = simplify_rounded_sides && size[1] == 2*ry ? quarterfn-1 : quarterfn)
	let(finalizepos = togmod1__make_nd_vector_adder(pos))
[
	for(a=[0 : 1 : qfnx]) let(ang=      a*90/quarterfn) finalizepos([ size[0]/2-rx + rx*cos(ang),  size[1]/2-ry + ry*sin(ang)]),
	for(a=[0 : 1 : qfny]) let(ang= 90 + a*90/quarterfn) finalizepos([-size[0]/2+rx + rx*cos(ang),  size[1]/2-ry + ry*sin(ang)]),
	for(a=[0 : 1 : qfnx]) let(ang=180 + a*90/quarterfn) finalizepos([-size[0]/2+rx + rx*cos(ang), -size[1]/2+ry + ry*sin(ang)]),
	for(a=[0 : 1 : qfny]) let(ang=270 + a*90/quarterfn) finalizepos([ size[0]/2-rx + rx*cos(ang), -size[1]/2+ry + ry*sin(ang)]),
];

function togmod1_make_rect(size) =
	togmod1_make_polygon([
		[-size[0]/2, -size[1]/2],
		[+size[0]/2, -size[1]/2],
		[+size[0]/2, +size[1]/2],
		[-size[0]/2, +size[1]/2],
	]);

function togmod1_make_rounded_rect(size, r) =
	r == 0 ? togmod1_make_rect(size) :
	togmod1_make_polygon(togmod1_rounded_rect_points(size,r,simplify_rounded_sides=true));

/**
 * Returns points for an approximation of a circle where points are at distance r from pos.
 * Can be used to make other regular polygons, but the faces will be less than that
 * distance from pos (do some trig if you want face distance, e.g. for a hex nut).
 */
function togmod1_circle_points(r, pos=[0,0], d=undef) =
	assert( !is_undef(r) || !is_undef(d) )
	assert(!is_undef(pos[0]))
	assert(!is_undef(pos[1]))
	let(finalizepos = togmod1__make_nd_vector_adder(pos))
	let(r_ = !is_undef(r) ? r : d/2)
	let(fn = max($fn, 3))
	[for(i=[0 : 1 : fn-1]) finalizepos([r_*cos(i*360/fn), r_*sin(i*360/fn)])];

function togmod1_make_circle(r, pos=[0,0], d=undef) =
	r == 0 || d == 0 ? ["union"] :
	togmod1_make_polygon(togmod1_circle_points(r=r, pos=pos, d=d));

function togmod1_make_cylinder(d, zrange=[0,1], r=undef, pos=[0,0]) =
	assert( !is_undef(r) || !is_undef(d) )
	let( r_ = !is_undef(r) ? r : d/2 )
	// TODO: Make polyhedron directly
	["linear-extrude-zs", zrange, togmod1_make_circle(r=r_, pos=pos)];

function togmod1__is_range1d(range) = is_list(range) && len(range) == 2 && is_num(range[0]) && is_num(range[1]);

function togmod1_linear_extrude_z(range, shape) =
	assert(togmod1__is_range1d(range))
	["linear-extrude-zs", range, shape];
function togmod1_linear_extrude_x(range, shape) =
	assert(togmod1__is_range1d(range))
	["rotate", [90, 0, 90], togmod1_linear_extrude_z(range, shape)];
function togmod1_linear_extrude_y(range, shape) =
	assert(togmod1__is_range1d(range))
	["rotate", [90, 0,  0], togmod1_linear_extrude_z([-range[1], -range[0]], shape)];

function togmod1_text(text, size, font, halign, valign, spacing, direction, language, script) =
	["text-tsfhvsdls", text, size, font, halign, valign, spacing, direction, language, script];
// file: ../lib/TOGMod1.scad
// TOGMod1.9
// OpenSCAD library for representing shapes
// 
// See also: Functional OpenSCAD (https://github.com/thehans/FunctionalOpenSCAD)
// 
// v1.8:
// - Add `text-tsfhvsdls`
// v1.9
// - Add `offset-ds` (offset with _d_elta a _s_hape)

module togmod1_domodule(mod) {
	assert(is_list(mod));
	assert(len(mod) > 0);
	if( mod[0] == "polygon-vp" ) {
		// ["polygon-vp", vertexes, paths]
		polygon(points=mod[1], paths=mod[2]);
	} else if( mod[0] == "polyhedron-vf" ) {
		polyhedron(mod[1], faces=mod[2]);
	} else if( mod[0] == "scale" ) {
		assert(len(mod) == 3);
		scale(mod[1]) togmod1_domodule(mod[2]);
	} else if( mod[0] == "translate" ) {
		assert(len(mod) == 3);
		assert(is_list(mod[1]));
		for(c=mod[1]) assert(is_num(c), "translate component should be numeric");
		translate(mod[1]) togmod1_domodule(mod[2]);
	} else if( mod[0] == "rotate" ) {
		assert(len(mod) == 3);
		rotate(mod[1]) togmod1_domodule(mod[2]);
	} else if( mod[0] == "intersection" ) {
		intersection_for( i=[1:1:len(mod)-1] ) togmod1_domodule(mod[i]);
	} else if( mod[0] == "difference" ) {
		difference() {
			togmod1_domodule(mod[1]);
			for( i=[2:1:len(mod)-1] ) togmod1_domodule(mod[i]);
		}
	} else if( mod[0] == "union" ) {
		for( i=[1:1:len(mod)-1] ) togmod1_domodule(mod[i]);
	} else if( mod[0] == "hull" ) {
		hull() for( i=[1:1:len(mod)-1] ) togmod1_domodule(mod[i]);
	} else if( mod[0] == "offset-rs" ) {
		assert(len(mod) == 3);
		assert(is_num(mod[1]));
		assert(is_list(mod[2]));
		offset(mod[1]) togmod1_domodule(mod[2]);
	} else if( mod[0] == "linear-extrude-zs" ) {
		// ["linear-extrude-zs", [z0,z1], 2d_shape] // centered
		// ["linear-extrude-zs", height, 2d_shape]
		let( zrange = is_list(mod[1]) ? mod[1] : [-mod[1]/2, mod[1]/2] ) {
			translate([0,0,zrange[0]]) linear_extrude(zrange[1]-zrange[0]) togmod1_domodule(mod[2]);
		}
	} else if( mod[0] == "render" ) {
		render() togmod1_domodule(mod[1]);
	} else if( mod[0] == "minkowski" ) {
		minkowski() {
			togmod1_domodule(mod[1]);
			togmod1_domodule(mod[2]);
		}
	} else if( mod[0] == "x-debug" ) {
		# togmod1_domodule(mod[1]);
	} else if( mod[0] == "x-color" ) {
		color(mod[1]) togmod1_domodule(mod[2]);
	} else if( mod[0] == "text-tsfhvsdls" ) {
		text(text=mod[1], size=mod[2], font=mod[3], halign=mod[4], valign=mod[5], spacing=mod[6], direction=mod[7], language=mod[7], script=mod[8]);
	} else if( mod[0] == "offset-ds" ) {
		assert(is_num(mod[1]));
		assert(is_list(mod[2]));
		offset(delta=mod[1]) togmod1_domodule(mod[2]);
	} else {
		assert(false, str("Unrecognized shape: ", mod[0]));
	}
}
// main file
// WeMosClip0.2
// 
// Prototype between-the-legs clip for a WeMos D1 mini.
// Idea is that the legs will fit somewhat snugly into
// a case, and this clip will squeeze between the legs
// to hold it more firmly.
// 
// v0.2:
// - Adjustments to make center gap always 1/4" wide,
//   so it can be used to align/attach to the case.

// Space for a pin; should probably be half a pin width or slightly under
pin_margin  = "0.25mm";
pin_spacing = "9/10inch";
thickness   = "1/16inch";
height      = "3/16inch";
length      = "7.75/10inch";

use <../lib/TOGMod1.scad>
use <../lib/TOGMod1Constructors.scad>
use <../lib/TOGPath1.scad>
use <../lib/TOGUnits1.scad>

$fn = 24;

function reverse_list(list) =
	[for(i=[len(list)-1 : -1 : 0]) list[i]];

function mirror_rathnodes(nodes) = [
	for(n=nodes) n,
	for(n=reverse_list(nodes)) [n[0], [-n[1][0], n[1][1]], for(i=[2:1:len(n)-1]) n[i]],
];

pin_margin_mm  = togunits1_to_mm(pin_margin);
pin_spacing_mm = togunits1_to_mm(pin_spacing);
thickness_mm   = togunits1_to_mm(thickness);
height_mm      = togunits1_to_mm(height);
length_mm      = togunits1_to_mm(length);
center_gap_width_mm = 25.4/4 + 0.1;

the_clip_2d = togpath1_rath_to_polygon(
	let( x0 = -pin_spacing_mm/2 + pin_margin_mm )
	let( y0 = -height_mm                 )
	let( y1 = y0 + thickness_mm          )
	let( y3 =  0                         )
	let( y2 = y3 - thickness_mm          )
	let( fold_positions = [each [x0 + thickness_mm*3.5 : thickness_mm * 4 : -center_gap_width_mm/2 - thickness_mm*1.4 ]] )
	let( last_fold_position = fold_positions[len(fold_positions)-1] )
	let( ocops = [["round", thickness_mm]]         )
	let( icops = [["round", thickness_mm*127/256]] )
	["togpath1-rath", each mirror_rathnodes([
		for( cx = reverse_list(fold_positions) ) each [
			["togpath1-rathnode", [cx+0.5*thickness_mm, y3], each ocops],
			["togpath1-rathnode", [cx+0.5*thickness_mm, y1], each icops],
			["togpath1-rathnode", [cx-0.5*thickness_mm, y1], each icops],
			["togpath1-rathnode", [cx-0.5*thickness_mm, y3], each ocops],
		],
		["togpath1-rathnode", [x0               , y3], each ocops],
		["togpath1-rathnode", [x0               , y0], each icops],
		["togpath1-rathnode", [x0+1*thickness_mm, y0], each icops],
		["togpath1-rathnode", [x0+1*thickness_mm, y2], each icops],
		for( cx = fold_positions ) each let(cx0 = cx - thickness_mm*1.5, cx1 = cx == last_fold_position ? -center_gap_width_mm/2 : cx + thickness_mm*1.5 ) [
			["togpath1-rathnode", [cx0, y2], each icops],
			["togpath1-rathnode", [cx0, y0], each ocops],
			["togpath1-rathnode", [cx1, y0], each ocops],
			["togpath1-rathnode", [cx1, y2], each icops],
		],
	])]
);

togmod1_domodule(togmod1_linear_extrude_z([0, length_mm], the_clip_2d));
